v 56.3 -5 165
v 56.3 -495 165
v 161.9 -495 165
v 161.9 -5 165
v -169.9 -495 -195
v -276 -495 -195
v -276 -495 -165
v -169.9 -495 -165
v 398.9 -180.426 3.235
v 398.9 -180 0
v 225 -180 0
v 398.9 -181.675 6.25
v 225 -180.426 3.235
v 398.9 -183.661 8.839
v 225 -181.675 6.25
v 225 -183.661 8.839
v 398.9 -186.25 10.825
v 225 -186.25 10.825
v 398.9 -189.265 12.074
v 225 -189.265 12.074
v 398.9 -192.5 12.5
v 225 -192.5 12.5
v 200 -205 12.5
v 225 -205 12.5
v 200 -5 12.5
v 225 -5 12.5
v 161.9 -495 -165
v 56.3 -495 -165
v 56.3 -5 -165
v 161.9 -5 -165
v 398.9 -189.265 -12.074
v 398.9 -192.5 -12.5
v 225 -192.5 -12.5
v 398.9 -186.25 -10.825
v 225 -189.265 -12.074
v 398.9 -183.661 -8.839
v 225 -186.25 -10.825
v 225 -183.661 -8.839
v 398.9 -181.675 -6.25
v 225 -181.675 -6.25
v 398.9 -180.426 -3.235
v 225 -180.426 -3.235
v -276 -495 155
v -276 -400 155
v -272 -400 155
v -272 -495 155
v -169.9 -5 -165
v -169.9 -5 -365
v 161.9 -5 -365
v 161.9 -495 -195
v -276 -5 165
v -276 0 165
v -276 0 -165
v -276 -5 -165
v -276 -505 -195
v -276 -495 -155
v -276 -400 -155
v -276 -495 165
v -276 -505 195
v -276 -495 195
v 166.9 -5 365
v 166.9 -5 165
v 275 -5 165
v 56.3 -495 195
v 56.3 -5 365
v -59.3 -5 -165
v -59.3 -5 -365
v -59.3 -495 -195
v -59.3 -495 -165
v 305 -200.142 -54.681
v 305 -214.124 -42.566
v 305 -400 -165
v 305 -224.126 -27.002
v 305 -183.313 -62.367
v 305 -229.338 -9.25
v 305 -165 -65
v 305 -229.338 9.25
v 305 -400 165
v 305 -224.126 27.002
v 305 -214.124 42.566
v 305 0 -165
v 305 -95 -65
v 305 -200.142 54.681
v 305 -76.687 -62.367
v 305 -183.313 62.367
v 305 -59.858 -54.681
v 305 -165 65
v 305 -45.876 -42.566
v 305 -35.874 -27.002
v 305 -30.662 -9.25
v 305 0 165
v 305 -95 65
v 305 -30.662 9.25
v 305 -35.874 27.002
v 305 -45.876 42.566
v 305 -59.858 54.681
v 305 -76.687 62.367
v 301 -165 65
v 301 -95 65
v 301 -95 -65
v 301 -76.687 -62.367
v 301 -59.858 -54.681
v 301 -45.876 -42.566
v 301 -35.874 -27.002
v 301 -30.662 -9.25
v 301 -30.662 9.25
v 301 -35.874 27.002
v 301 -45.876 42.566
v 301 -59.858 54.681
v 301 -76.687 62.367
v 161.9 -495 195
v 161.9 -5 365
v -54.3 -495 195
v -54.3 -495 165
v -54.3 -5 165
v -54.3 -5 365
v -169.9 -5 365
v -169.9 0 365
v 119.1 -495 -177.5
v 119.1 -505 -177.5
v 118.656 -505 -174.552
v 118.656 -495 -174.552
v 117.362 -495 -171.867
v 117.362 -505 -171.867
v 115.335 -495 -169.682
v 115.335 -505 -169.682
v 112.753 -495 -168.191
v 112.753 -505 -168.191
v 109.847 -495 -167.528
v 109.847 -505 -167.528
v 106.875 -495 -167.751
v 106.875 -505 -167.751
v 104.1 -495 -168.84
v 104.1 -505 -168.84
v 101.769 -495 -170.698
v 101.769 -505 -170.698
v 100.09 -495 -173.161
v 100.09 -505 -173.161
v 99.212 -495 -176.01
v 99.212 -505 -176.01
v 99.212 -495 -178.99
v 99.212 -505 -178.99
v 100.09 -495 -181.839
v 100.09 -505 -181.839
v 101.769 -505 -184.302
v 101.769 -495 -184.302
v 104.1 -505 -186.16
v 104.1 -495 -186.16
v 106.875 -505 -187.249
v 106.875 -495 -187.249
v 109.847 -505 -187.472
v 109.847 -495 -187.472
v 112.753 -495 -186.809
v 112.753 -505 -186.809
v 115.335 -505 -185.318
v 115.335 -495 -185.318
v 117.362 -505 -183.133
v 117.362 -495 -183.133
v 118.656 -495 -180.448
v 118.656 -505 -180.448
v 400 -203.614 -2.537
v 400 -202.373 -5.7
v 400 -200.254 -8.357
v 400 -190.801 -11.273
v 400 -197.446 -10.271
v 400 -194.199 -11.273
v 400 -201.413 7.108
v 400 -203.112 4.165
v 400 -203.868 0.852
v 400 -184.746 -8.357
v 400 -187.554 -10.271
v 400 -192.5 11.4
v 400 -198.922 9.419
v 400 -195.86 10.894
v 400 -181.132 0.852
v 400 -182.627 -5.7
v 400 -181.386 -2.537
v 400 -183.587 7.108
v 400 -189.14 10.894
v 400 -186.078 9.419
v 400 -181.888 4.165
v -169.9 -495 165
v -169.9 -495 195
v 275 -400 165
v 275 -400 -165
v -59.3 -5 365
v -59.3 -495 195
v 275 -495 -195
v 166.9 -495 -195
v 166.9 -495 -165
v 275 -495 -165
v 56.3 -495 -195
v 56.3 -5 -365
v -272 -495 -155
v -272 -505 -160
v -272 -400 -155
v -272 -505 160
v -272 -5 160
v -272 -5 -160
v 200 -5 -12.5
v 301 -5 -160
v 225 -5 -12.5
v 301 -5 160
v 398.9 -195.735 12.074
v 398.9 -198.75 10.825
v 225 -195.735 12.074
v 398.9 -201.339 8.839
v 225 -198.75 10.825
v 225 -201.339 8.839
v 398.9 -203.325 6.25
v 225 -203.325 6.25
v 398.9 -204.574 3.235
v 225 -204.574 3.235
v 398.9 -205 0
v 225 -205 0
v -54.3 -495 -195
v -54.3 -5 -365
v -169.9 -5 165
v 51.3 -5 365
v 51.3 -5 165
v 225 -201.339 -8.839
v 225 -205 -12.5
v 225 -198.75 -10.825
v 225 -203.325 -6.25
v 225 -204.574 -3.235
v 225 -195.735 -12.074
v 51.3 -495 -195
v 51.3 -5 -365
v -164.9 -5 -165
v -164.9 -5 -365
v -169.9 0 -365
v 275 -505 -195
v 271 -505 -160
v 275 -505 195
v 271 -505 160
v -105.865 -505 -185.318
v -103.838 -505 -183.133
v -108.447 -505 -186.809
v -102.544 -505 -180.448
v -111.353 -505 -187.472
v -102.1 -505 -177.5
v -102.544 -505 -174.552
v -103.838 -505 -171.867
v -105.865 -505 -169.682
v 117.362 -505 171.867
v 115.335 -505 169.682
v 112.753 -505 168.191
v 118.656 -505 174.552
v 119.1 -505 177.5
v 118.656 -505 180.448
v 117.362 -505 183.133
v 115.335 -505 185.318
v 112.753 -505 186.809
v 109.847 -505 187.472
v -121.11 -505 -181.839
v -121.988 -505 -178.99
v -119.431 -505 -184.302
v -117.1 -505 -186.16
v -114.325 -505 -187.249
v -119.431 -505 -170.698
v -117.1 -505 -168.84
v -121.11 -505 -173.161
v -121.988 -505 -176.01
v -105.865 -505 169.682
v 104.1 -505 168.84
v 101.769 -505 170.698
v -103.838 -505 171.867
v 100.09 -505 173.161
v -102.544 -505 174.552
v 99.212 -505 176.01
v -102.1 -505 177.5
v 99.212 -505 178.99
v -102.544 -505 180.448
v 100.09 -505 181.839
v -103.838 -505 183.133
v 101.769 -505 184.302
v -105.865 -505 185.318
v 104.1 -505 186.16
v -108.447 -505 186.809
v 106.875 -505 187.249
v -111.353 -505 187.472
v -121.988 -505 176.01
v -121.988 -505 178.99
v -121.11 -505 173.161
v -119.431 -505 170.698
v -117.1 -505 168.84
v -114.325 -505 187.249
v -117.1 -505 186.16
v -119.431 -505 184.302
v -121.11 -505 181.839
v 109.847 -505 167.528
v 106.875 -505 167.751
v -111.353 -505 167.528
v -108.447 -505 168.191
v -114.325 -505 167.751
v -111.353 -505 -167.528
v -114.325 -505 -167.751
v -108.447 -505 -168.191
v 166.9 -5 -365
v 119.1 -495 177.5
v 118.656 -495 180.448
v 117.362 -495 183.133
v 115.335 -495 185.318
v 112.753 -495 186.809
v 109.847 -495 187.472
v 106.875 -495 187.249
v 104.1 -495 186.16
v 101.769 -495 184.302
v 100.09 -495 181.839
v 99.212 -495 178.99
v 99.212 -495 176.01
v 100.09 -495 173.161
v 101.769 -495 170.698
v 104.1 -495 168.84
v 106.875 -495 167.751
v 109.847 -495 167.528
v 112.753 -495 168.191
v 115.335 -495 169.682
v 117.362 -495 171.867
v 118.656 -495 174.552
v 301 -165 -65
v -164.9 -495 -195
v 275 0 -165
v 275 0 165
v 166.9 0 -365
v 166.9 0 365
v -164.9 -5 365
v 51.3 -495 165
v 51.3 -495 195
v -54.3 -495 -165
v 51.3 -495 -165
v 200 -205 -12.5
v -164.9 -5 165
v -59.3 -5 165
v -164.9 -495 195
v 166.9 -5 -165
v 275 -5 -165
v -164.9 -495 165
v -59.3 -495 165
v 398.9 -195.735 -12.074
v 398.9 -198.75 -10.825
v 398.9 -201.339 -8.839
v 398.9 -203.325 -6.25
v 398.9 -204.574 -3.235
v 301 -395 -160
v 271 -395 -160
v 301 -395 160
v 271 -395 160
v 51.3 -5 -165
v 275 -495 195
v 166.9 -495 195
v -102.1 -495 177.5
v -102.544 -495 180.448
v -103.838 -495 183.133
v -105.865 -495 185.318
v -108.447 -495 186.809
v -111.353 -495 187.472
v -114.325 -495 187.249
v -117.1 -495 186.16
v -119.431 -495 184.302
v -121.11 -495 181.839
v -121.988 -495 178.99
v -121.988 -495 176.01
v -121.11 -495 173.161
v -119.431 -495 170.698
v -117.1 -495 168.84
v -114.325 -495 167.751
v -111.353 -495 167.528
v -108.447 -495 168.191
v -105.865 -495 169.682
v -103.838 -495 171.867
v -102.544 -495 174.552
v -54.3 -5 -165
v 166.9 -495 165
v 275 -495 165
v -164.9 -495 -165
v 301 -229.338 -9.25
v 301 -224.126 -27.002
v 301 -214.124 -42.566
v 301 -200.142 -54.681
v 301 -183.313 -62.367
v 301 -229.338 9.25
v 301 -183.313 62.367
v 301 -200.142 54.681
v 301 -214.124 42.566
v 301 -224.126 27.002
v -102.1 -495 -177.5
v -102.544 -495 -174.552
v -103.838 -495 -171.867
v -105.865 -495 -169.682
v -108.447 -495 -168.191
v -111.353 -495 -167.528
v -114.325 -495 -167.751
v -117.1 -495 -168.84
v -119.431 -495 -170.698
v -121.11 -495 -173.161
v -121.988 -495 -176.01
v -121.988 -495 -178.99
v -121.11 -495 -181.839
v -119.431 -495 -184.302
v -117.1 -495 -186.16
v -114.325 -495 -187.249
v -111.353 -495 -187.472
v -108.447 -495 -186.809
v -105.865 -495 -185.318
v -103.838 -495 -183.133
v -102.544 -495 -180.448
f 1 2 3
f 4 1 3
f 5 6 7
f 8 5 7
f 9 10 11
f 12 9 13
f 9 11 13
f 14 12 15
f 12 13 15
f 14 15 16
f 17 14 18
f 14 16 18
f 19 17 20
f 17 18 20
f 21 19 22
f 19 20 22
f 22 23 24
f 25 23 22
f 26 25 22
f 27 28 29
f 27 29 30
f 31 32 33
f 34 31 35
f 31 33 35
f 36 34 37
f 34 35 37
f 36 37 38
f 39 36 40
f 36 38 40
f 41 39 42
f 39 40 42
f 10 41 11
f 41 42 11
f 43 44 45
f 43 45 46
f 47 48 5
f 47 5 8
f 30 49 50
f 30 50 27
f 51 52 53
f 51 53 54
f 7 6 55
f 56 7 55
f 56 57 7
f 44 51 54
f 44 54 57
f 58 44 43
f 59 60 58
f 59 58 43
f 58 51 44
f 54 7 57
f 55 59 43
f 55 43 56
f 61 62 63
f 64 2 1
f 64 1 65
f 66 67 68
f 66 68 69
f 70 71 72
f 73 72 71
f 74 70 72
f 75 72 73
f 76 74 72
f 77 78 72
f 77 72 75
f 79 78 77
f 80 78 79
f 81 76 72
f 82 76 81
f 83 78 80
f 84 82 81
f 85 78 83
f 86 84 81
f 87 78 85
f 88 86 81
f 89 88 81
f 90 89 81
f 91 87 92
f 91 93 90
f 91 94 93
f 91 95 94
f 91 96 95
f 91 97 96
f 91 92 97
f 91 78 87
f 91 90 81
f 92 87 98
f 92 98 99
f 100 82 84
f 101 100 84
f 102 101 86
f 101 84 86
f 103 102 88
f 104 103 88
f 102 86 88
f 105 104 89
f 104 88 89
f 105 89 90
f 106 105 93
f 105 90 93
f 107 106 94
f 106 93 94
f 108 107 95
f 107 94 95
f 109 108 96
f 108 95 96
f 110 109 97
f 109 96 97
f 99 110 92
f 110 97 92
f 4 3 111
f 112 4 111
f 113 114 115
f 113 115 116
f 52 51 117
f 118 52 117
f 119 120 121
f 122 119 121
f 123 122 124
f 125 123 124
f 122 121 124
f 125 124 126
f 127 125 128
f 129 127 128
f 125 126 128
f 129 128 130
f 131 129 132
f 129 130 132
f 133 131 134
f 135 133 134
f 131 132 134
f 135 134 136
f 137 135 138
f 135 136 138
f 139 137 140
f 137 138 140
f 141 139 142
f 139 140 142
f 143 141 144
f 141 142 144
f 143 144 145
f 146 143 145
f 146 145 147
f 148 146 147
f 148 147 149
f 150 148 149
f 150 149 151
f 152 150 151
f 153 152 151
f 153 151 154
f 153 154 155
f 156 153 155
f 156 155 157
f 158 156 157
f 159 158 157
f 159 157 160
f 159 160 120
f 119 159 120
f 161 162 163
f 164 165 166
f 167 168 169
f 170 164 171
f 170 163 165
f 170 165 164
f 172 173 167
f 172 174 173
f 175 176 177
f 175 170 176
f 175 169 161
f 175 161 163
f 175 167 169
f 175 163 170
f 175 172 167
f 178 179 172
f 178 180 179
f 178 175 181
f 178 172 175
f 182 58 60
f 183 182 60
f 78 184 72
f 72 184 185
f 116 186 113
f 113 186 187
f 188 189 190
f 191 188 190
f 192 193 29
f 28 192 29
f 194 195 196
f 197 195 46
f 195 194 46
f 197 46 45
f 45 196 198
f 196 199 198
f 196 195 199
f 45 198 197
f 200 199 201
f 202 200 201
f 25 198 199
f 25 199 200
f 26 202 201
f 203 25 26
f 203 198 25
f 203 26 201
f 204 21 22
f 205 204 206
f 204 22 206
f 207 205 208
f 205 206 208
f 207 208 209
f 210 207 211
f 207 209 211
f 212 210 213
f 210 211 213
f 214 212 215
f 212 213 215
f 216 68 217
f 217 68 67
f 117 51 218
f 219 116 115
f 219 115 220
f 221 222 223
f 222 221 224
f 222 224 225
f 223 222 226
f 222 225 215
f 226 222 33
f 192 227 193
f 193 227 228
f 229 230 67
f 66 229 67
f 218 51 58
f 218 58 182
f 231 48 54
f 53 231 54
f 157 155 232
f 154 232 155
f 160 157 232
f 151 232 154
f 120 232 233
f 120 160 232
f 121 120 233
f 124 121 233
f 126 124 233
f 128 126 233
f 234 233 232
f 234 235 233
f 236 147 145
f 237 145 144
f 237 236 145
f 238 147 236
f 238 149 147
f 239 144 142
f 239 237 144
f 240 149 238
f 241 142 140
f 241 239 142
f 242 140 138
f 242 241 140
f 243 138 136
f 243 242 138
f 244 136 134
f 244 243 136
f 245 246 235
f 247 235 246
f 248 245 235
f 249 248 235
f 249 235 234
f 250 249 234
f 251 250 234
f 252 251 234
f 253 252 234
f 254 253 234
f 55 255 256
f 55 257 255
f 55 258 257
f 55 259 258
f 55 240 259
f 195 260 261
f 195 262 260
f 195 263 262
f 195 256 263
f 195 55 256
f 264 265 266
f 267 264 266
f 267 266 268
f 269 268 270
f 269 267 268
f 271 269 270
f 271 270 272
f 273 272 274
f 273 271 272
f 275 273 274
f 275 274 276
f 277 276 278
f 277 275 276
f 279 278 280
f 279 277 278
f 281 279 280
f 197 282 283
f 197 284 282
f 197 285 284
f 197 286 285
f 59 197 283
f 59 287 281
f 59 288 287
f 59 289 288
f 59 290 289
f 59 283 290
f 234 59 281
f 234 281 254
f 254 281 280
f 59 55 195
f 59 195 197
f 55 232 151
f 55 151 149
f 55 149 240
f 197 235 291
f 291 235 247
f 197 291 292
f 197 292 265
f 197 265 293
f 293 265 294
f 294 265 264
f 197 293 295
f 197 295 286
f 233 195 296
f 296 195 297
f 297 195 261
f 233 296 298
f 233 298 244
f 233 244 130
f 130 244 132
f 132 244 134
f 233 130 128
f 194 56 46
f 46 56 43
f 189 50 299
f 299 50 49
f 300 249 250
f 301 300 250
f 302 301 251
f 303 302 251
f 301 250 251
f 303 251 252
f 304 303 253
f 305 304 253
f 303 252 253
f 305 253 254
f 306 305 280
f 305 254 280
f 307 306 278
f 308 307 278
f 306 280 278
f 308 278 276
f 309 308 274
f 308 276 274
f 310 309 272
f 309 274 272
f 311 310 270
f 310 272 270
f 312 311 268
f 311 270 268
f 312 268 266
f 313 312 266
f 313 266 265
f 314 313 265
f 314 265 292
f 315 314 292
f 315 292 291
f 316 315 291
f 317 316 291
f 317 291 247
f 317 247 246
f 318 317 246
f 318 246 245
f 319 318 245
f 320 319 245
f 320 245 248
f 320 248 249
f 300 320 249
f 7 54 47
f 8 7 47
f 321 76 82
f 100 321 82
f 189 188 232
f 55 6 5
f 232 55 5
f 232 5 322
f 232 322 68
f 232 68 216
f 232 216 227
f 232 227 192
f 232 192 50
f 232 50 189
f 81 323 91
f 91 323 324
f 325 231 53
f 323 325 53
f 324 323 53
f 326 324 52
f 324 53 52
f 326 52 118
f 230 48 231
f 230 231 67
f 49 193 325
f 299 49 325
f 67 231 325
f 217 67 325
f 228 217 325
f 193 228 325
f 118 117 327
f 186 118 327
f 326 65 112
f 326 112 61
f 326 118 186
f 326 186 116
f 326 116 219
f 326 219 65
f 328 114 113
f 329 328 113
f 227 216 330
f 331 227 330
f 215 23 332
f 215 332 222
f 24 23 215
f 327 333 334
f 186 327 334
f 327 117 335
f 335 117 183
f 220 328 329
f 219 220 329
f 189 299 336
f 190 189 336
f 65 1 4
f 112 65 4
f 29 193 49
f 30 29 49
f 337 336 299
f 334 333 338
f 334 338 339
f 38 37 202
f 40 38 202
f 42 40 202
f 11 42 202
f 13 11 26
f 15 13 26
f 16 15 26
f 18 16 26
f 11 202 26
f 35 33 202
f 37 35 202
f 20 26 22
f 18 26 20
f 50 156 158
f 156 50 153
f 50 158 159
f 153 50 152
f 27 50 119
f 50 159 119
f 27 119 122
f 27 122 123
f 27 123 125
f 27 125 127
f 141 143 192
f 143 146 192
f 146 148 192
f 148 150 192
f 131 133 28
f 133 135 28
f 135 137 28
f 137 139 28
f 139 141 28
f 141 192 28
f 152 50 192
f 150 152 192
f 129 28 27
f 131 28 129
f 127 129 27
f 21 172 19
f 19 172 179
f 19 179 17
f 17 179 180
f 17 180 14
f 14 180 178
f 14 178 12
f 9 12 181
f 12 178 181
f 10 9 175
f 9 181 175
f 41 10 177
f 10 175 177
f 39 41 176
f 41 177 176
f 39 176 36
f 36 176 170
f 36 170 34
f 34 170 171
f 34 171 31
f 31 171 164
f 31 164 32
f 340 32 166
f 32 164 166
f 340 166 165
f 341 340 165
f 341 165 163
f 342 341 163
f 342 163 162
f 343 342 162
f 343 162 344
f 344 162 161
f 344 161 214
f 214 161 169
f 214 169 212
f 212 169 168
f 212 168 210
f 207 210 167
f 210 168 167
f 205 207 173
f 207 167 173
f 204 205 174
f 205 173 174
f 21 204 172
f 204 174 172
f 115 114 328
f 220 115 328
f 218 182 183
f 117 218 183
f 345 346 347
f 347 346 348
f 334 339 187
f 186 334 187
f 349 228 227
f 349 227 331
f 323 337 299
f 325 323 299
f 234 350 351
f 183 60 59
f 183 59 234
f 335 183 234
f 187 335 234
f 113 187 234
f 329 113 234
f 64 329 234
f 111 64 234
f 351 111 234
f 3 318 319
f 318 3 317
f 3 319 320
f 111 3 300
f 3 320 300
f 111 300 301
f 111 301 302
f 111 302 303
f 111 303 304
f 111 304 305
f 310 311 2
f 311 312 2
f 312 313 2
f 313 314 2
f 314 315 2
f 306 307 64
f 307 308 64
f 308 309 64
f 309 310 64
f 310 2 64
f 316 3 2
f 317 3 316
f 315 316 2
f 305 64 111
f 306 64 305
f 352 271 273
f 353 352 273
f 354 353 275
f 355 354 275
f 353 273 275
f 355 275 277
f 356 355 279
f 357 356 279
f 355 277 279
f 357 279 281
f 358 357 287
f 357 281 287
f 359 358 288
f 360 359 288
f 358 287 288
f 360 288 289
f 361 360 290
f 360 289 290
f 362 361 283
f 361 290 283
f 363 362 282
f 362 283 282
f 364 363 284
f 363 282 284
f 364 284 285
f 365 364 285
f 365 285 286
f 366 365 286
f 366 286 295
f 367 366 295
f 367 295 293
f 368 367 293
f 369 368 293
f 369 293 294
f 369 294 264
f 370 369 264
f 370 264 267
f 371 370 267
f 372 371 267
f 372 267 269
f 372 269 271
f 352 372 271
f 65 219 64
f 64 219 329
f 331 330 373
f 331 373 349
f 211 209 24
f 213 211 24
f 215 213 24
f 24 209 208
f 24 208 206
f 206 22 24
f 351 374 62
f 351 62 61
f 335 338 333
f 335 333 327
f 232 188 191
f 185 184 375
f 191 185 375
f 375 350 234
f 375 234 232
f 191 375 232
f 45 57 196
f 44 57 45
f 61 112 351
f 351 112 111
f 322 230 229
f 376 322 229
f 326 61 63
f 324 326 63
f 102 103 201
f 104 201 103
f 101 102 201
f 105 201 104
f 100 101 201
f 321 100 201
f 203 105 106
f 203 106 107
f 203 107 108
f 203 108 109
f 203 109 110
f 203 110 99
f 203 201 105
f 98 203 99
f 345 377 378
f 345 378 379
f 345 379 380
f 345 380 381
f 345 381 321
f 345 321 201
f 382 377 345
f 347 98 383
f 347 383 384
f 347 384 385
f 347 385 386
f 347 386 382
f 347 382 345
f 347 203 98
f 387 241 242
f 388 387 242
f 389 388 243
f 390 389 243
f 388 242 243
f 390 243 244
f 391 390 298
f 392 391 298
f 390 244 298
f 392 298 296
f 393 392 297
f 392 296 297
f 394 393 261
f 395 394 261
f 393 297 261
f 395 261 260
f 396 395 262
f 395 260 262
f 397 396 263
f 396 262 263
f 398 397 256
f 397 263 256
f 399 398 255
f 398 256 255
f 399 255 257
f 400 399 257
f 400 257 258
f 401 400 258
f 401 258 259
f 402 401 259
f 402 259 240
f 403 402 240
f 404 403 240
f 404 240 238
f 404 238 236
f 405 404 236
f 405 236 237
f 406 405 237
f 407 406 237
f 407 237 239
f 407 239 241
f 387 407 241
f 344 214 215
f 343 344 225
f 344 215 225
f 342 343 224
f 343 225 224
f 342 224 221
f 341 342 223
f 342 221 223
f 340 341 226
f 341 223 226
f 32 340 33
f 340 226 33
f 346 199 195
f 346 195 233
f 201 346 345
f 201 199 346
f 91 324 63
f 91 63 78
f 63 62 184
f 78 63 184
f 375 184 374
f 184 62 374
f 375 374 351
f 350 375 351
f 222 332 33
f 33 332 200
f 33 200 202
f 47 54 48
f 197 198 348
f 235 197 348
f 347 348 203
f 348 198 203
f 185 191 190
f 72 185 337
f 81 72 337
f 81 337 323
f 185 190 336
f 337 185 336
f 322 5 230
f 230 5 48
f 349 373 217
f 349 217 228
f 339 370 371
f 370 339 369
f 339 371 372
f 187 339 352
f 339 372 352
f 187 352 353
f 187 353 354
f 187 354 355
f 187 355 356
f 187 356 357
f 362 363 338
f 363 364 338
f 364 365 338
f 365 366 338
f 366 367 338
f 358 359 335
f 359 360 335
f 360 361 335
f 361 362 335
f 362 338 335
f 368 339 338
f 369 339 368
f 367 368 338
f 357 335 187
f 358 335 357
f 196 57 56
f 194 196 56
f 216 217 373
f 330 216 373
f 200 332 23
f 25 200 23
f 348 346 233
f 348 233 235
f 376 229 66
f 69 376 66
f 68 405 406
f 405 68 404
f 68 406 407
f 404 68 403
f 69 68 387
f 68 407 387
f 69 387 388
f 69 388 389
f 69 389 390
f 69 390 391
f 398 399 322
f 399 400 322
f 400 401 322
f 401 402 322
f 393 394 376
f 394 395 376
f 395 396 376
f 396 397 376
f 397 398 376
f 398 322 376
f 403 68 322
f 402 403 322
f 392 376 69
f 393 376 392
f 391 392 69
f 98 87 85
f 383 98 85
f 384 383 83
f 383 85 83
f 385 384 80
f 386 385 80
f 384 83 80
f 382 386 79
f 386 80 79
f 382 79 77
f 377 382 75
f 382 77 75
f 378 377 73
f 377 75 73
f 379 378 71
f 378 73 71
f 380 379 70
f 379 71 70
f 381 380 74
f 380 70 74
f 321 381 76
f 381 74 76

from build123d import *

# Parameters (mm, degrees)
F0_W      = 753
F0_H      = 730
F1_DEPTH  = 5
F2_W      = 551
F2_H      = 330
F2_W_2    = 543
F2_H_2    = 320
F3_DEPTH  = 500
F4_W      = 10
F4_H      = 30
F5_DEPTH  = 551
F6_W      = 5
F6_H      = 200
F7_DEPTH  = 490
F10_DEPTH = 546.401
F13_DEPTH = 5.001
F15_DEPTH = 30
F16_W     = 390
F16_H     = 320
F17_DEPTH = 30
F18_W     = 70
F18_H     = 130
F19_DEPTH = 5
F20_W     = 95
F20_H     = 310
F21_DEPTH = 5
F22_W     = 25
F22_H     = 25
F23_DEPTH = 200
F25_DEPTH = 175
F27_R     = 10
F28_DEPTH = 25


# Not quite as in the source:
# - a fillet or chamfer that OpenCascade refuses, or shapes differently, is made with other operations: its cross-section is extruded or revolved along the edge and cut away or added


with BuildPart() as f1:
    # F0 (on Front) → F1 (new body)
    with BuildSketch(Plane.XZ):
        Rectangle(F0_W, F0_H)
    extrude(amount=F1_DEPTH)

    # F2 (on face) → F3 (join)
    with BuildSketch(Plane.XZ.offset(5)):
        with Locations((-0.5, 0)):
            Rectangle(F2_W, F2_H)
        with Locations((-0.5, 0)):
            Rectangle(F2_W_2, F2_H_2, mode=Mode.SUBTRACT)
    extrude(amount=F3_DEPTH)

    # F4 (on face) → F5 (join, through all)
    with BuildSketch(Plane(origin=(-276, 0, 0), x_dir=(0, -1, 0), z_dir=(-1, 0, 0))):
        with Locations((500, 180)):
            Rectangle(F4_W, F4_H)
        with Locations((500, -180)):
            Rectangle(F4_W, F4_H)
    extrude(amount=-F5_DEPTH)

    # F6 (on face) → F7 (join, through all)
    with BuildSketch(Plane.XZ.offset(5)):
        with Locations((164.4, 265)):
            Rectangle(F6_W, F6_H)
        with Locations((53.8, 265)):
            Rectangle(F6_W, F6_H)
        with Locations((-56.8, 265)):
            Rectangle(F6_W, F6_H)
        with Locations((-167.4, 265)):
            Rectangle(F6_W, F6_H)
        with Locations((164.4, -265)):
            Rectangle(F6_W, F6_H)
        with Locations((53.8, -265)):
            Rectangle(F6_W, F6_H)
        with Locations((-56.8, -265)):
            Rectangle(F6_W, F6_H)
        with Locations((-167.4, -265)):
            Rectangle(F6_W, F6_H)
    extrude(amount=F7_DEPTH)

    # F8 (on face) + F9 (on face) → F10 (cut, through all)
    with BuildSketch(Plane(origin=(-169.9, 0, 0), x_dir=(0, -1, 0), z_dir=(-1, 0, 0))):
        Polygon((5, 365), (495, 195), (495, 365), align=None)
    with BuildSketch(Plane(origin=(-169.9, 0, 0), x_dir=(0, -1, 0), z_dir=(-1, 0, 0))):
        Polygon((495, -365), (495, -195), (5, -365), align=None)
    extrude(amount=-F10_DEPTH, mode=Mode.SUBTRACT)

    # F11 (on face) + F12 (on face) → F13 (cut, through all)
    with BuildSketch(Plane.XZ.offset(5)):
        Polygon((275, -165), (166.9, -365), (376.5, -365), (376.5, 365), (166.9, 365), (275, 165), align=None)
    with BuildSketch(Plane.XZ.offset(5)):
        Polygon((-376.5, -365), (-169.9, -365), (-276, -165), (-276, 165), (-169.9, 365), (-376.5, 365), align=None)
    extrude(amount=-F13_DEPTH, mode=Mode.SUBTRACT)

    # F14 (on face) → F15 (join)
    with BuildSketch(Plane.YZ.offset(275)):
        Polygon((-5, -165), (0, -165), (0, 165), (-5, 165), (-400, 165), (-400, -165), align=None)
    extrude(amount=F15_DEPTH)

    # F16 (on face) → F17 (cut)
    with BuildSketch(Plane(origin=(271, 0, 0), x_dir=(0, -1, 0), z_dir=(-1, 0, 0))):
        with Locations((200, 0)):
            Rectangle(F16_W, F16_H)
    extrude(amount=-F17_DEPTH, mode=Mode.SUBTRACT)

    # F18 (on face) → F19 (cut)
    with BuildSketch(Plane.YZ.offset(305)):
        with BuildLine():
            ThreePointArc((-165, 65), (-230, 0), (-165, -65))
            Line((-165, -65), (-165, 65))
        make_face()
        with Locations((-130, 0)):
            Rectangle(F18_W, F18_H)
        with BuildLine():
            Line((-95, 65), (-95, -65))
            ThreePointArc((-95, -65), (-30, 0), (-95, 65))
        make_face()
    extrude(amount=-F19_DEPTH, mode=Mode.SUBTRACT)

    # F20 (on face) → F21 (cut)
    with BuildSketch(Plane(origin=(-276, 0, 0), x_dir=(0, -1, 0), z_dir=(-1, 0, 0))):
        with Locations((447.5, 0)):
            Rectangle(F20_W, F20_H)
    extrude(amount=-F21_DEPTH, mode=Mode.SUBTRACT)

    # F22 (on face) → F23 (join)
    with BuildSketch(Plane.XZ.offset(5)):
        with Locations((212.5, 0)):
            Rectangle(F22_W, F22_H)
    extrude(amount=F23_DEPTH)

    # F24 (on face) → F25 (join)
    with BuildSketch(Plane.YZ.offset(225)):
        with BuildLine():
            ThreePointArc((-192.5, -12.5), (-183.6611652352, -8.8388347648), (-180, 0))
            ThreePointArc((-180, 0), (-183.6611652352, 8.8388347648), (-192.5, 12.5))
            ThreePointArc((-192.5, 12.5), (-201.3388347648, 8.8388347648), (-205, 0))
            ThreePointArc((-205, 0), (-201.3388347648, -8.8388347648), (-192.5, -12.5))
        make_face()
    extrude(amount=F25_DEPTH)

    # F26: chamfer of 1.1 on 1 edges, made by hand

    # F26_s1 → F26_t2 (revolve, cut)
    with BuildSketch(Plane.XZ.offset(192.5)):
        Polygon((398.9, 12.5), (400, 11.4), (400, 12.5), align=None)
    revolve(axis=Axis((400, -192.5, 0), (-1, 0, 0)), mode=Mode.SUBTRACT)

    # F27 (on face) → F28 (cut)
    with BuildSketch(Plane.XZ.offset(505)):
        with Locations((109.1, 177.5)):
            Circle(F27_R)
        with Locations((-112.1, 177.5)):
            Circle(F27_R)
        with Locations((-112.1, -177.5)):
            Circle(F27_R)
        with Locations((109.1, -177.5)):
            Circle(F27_R)
    extrude(amount=-F28_DEPTH, mode=Mode.SUBTRACT)


solid = f1.part
